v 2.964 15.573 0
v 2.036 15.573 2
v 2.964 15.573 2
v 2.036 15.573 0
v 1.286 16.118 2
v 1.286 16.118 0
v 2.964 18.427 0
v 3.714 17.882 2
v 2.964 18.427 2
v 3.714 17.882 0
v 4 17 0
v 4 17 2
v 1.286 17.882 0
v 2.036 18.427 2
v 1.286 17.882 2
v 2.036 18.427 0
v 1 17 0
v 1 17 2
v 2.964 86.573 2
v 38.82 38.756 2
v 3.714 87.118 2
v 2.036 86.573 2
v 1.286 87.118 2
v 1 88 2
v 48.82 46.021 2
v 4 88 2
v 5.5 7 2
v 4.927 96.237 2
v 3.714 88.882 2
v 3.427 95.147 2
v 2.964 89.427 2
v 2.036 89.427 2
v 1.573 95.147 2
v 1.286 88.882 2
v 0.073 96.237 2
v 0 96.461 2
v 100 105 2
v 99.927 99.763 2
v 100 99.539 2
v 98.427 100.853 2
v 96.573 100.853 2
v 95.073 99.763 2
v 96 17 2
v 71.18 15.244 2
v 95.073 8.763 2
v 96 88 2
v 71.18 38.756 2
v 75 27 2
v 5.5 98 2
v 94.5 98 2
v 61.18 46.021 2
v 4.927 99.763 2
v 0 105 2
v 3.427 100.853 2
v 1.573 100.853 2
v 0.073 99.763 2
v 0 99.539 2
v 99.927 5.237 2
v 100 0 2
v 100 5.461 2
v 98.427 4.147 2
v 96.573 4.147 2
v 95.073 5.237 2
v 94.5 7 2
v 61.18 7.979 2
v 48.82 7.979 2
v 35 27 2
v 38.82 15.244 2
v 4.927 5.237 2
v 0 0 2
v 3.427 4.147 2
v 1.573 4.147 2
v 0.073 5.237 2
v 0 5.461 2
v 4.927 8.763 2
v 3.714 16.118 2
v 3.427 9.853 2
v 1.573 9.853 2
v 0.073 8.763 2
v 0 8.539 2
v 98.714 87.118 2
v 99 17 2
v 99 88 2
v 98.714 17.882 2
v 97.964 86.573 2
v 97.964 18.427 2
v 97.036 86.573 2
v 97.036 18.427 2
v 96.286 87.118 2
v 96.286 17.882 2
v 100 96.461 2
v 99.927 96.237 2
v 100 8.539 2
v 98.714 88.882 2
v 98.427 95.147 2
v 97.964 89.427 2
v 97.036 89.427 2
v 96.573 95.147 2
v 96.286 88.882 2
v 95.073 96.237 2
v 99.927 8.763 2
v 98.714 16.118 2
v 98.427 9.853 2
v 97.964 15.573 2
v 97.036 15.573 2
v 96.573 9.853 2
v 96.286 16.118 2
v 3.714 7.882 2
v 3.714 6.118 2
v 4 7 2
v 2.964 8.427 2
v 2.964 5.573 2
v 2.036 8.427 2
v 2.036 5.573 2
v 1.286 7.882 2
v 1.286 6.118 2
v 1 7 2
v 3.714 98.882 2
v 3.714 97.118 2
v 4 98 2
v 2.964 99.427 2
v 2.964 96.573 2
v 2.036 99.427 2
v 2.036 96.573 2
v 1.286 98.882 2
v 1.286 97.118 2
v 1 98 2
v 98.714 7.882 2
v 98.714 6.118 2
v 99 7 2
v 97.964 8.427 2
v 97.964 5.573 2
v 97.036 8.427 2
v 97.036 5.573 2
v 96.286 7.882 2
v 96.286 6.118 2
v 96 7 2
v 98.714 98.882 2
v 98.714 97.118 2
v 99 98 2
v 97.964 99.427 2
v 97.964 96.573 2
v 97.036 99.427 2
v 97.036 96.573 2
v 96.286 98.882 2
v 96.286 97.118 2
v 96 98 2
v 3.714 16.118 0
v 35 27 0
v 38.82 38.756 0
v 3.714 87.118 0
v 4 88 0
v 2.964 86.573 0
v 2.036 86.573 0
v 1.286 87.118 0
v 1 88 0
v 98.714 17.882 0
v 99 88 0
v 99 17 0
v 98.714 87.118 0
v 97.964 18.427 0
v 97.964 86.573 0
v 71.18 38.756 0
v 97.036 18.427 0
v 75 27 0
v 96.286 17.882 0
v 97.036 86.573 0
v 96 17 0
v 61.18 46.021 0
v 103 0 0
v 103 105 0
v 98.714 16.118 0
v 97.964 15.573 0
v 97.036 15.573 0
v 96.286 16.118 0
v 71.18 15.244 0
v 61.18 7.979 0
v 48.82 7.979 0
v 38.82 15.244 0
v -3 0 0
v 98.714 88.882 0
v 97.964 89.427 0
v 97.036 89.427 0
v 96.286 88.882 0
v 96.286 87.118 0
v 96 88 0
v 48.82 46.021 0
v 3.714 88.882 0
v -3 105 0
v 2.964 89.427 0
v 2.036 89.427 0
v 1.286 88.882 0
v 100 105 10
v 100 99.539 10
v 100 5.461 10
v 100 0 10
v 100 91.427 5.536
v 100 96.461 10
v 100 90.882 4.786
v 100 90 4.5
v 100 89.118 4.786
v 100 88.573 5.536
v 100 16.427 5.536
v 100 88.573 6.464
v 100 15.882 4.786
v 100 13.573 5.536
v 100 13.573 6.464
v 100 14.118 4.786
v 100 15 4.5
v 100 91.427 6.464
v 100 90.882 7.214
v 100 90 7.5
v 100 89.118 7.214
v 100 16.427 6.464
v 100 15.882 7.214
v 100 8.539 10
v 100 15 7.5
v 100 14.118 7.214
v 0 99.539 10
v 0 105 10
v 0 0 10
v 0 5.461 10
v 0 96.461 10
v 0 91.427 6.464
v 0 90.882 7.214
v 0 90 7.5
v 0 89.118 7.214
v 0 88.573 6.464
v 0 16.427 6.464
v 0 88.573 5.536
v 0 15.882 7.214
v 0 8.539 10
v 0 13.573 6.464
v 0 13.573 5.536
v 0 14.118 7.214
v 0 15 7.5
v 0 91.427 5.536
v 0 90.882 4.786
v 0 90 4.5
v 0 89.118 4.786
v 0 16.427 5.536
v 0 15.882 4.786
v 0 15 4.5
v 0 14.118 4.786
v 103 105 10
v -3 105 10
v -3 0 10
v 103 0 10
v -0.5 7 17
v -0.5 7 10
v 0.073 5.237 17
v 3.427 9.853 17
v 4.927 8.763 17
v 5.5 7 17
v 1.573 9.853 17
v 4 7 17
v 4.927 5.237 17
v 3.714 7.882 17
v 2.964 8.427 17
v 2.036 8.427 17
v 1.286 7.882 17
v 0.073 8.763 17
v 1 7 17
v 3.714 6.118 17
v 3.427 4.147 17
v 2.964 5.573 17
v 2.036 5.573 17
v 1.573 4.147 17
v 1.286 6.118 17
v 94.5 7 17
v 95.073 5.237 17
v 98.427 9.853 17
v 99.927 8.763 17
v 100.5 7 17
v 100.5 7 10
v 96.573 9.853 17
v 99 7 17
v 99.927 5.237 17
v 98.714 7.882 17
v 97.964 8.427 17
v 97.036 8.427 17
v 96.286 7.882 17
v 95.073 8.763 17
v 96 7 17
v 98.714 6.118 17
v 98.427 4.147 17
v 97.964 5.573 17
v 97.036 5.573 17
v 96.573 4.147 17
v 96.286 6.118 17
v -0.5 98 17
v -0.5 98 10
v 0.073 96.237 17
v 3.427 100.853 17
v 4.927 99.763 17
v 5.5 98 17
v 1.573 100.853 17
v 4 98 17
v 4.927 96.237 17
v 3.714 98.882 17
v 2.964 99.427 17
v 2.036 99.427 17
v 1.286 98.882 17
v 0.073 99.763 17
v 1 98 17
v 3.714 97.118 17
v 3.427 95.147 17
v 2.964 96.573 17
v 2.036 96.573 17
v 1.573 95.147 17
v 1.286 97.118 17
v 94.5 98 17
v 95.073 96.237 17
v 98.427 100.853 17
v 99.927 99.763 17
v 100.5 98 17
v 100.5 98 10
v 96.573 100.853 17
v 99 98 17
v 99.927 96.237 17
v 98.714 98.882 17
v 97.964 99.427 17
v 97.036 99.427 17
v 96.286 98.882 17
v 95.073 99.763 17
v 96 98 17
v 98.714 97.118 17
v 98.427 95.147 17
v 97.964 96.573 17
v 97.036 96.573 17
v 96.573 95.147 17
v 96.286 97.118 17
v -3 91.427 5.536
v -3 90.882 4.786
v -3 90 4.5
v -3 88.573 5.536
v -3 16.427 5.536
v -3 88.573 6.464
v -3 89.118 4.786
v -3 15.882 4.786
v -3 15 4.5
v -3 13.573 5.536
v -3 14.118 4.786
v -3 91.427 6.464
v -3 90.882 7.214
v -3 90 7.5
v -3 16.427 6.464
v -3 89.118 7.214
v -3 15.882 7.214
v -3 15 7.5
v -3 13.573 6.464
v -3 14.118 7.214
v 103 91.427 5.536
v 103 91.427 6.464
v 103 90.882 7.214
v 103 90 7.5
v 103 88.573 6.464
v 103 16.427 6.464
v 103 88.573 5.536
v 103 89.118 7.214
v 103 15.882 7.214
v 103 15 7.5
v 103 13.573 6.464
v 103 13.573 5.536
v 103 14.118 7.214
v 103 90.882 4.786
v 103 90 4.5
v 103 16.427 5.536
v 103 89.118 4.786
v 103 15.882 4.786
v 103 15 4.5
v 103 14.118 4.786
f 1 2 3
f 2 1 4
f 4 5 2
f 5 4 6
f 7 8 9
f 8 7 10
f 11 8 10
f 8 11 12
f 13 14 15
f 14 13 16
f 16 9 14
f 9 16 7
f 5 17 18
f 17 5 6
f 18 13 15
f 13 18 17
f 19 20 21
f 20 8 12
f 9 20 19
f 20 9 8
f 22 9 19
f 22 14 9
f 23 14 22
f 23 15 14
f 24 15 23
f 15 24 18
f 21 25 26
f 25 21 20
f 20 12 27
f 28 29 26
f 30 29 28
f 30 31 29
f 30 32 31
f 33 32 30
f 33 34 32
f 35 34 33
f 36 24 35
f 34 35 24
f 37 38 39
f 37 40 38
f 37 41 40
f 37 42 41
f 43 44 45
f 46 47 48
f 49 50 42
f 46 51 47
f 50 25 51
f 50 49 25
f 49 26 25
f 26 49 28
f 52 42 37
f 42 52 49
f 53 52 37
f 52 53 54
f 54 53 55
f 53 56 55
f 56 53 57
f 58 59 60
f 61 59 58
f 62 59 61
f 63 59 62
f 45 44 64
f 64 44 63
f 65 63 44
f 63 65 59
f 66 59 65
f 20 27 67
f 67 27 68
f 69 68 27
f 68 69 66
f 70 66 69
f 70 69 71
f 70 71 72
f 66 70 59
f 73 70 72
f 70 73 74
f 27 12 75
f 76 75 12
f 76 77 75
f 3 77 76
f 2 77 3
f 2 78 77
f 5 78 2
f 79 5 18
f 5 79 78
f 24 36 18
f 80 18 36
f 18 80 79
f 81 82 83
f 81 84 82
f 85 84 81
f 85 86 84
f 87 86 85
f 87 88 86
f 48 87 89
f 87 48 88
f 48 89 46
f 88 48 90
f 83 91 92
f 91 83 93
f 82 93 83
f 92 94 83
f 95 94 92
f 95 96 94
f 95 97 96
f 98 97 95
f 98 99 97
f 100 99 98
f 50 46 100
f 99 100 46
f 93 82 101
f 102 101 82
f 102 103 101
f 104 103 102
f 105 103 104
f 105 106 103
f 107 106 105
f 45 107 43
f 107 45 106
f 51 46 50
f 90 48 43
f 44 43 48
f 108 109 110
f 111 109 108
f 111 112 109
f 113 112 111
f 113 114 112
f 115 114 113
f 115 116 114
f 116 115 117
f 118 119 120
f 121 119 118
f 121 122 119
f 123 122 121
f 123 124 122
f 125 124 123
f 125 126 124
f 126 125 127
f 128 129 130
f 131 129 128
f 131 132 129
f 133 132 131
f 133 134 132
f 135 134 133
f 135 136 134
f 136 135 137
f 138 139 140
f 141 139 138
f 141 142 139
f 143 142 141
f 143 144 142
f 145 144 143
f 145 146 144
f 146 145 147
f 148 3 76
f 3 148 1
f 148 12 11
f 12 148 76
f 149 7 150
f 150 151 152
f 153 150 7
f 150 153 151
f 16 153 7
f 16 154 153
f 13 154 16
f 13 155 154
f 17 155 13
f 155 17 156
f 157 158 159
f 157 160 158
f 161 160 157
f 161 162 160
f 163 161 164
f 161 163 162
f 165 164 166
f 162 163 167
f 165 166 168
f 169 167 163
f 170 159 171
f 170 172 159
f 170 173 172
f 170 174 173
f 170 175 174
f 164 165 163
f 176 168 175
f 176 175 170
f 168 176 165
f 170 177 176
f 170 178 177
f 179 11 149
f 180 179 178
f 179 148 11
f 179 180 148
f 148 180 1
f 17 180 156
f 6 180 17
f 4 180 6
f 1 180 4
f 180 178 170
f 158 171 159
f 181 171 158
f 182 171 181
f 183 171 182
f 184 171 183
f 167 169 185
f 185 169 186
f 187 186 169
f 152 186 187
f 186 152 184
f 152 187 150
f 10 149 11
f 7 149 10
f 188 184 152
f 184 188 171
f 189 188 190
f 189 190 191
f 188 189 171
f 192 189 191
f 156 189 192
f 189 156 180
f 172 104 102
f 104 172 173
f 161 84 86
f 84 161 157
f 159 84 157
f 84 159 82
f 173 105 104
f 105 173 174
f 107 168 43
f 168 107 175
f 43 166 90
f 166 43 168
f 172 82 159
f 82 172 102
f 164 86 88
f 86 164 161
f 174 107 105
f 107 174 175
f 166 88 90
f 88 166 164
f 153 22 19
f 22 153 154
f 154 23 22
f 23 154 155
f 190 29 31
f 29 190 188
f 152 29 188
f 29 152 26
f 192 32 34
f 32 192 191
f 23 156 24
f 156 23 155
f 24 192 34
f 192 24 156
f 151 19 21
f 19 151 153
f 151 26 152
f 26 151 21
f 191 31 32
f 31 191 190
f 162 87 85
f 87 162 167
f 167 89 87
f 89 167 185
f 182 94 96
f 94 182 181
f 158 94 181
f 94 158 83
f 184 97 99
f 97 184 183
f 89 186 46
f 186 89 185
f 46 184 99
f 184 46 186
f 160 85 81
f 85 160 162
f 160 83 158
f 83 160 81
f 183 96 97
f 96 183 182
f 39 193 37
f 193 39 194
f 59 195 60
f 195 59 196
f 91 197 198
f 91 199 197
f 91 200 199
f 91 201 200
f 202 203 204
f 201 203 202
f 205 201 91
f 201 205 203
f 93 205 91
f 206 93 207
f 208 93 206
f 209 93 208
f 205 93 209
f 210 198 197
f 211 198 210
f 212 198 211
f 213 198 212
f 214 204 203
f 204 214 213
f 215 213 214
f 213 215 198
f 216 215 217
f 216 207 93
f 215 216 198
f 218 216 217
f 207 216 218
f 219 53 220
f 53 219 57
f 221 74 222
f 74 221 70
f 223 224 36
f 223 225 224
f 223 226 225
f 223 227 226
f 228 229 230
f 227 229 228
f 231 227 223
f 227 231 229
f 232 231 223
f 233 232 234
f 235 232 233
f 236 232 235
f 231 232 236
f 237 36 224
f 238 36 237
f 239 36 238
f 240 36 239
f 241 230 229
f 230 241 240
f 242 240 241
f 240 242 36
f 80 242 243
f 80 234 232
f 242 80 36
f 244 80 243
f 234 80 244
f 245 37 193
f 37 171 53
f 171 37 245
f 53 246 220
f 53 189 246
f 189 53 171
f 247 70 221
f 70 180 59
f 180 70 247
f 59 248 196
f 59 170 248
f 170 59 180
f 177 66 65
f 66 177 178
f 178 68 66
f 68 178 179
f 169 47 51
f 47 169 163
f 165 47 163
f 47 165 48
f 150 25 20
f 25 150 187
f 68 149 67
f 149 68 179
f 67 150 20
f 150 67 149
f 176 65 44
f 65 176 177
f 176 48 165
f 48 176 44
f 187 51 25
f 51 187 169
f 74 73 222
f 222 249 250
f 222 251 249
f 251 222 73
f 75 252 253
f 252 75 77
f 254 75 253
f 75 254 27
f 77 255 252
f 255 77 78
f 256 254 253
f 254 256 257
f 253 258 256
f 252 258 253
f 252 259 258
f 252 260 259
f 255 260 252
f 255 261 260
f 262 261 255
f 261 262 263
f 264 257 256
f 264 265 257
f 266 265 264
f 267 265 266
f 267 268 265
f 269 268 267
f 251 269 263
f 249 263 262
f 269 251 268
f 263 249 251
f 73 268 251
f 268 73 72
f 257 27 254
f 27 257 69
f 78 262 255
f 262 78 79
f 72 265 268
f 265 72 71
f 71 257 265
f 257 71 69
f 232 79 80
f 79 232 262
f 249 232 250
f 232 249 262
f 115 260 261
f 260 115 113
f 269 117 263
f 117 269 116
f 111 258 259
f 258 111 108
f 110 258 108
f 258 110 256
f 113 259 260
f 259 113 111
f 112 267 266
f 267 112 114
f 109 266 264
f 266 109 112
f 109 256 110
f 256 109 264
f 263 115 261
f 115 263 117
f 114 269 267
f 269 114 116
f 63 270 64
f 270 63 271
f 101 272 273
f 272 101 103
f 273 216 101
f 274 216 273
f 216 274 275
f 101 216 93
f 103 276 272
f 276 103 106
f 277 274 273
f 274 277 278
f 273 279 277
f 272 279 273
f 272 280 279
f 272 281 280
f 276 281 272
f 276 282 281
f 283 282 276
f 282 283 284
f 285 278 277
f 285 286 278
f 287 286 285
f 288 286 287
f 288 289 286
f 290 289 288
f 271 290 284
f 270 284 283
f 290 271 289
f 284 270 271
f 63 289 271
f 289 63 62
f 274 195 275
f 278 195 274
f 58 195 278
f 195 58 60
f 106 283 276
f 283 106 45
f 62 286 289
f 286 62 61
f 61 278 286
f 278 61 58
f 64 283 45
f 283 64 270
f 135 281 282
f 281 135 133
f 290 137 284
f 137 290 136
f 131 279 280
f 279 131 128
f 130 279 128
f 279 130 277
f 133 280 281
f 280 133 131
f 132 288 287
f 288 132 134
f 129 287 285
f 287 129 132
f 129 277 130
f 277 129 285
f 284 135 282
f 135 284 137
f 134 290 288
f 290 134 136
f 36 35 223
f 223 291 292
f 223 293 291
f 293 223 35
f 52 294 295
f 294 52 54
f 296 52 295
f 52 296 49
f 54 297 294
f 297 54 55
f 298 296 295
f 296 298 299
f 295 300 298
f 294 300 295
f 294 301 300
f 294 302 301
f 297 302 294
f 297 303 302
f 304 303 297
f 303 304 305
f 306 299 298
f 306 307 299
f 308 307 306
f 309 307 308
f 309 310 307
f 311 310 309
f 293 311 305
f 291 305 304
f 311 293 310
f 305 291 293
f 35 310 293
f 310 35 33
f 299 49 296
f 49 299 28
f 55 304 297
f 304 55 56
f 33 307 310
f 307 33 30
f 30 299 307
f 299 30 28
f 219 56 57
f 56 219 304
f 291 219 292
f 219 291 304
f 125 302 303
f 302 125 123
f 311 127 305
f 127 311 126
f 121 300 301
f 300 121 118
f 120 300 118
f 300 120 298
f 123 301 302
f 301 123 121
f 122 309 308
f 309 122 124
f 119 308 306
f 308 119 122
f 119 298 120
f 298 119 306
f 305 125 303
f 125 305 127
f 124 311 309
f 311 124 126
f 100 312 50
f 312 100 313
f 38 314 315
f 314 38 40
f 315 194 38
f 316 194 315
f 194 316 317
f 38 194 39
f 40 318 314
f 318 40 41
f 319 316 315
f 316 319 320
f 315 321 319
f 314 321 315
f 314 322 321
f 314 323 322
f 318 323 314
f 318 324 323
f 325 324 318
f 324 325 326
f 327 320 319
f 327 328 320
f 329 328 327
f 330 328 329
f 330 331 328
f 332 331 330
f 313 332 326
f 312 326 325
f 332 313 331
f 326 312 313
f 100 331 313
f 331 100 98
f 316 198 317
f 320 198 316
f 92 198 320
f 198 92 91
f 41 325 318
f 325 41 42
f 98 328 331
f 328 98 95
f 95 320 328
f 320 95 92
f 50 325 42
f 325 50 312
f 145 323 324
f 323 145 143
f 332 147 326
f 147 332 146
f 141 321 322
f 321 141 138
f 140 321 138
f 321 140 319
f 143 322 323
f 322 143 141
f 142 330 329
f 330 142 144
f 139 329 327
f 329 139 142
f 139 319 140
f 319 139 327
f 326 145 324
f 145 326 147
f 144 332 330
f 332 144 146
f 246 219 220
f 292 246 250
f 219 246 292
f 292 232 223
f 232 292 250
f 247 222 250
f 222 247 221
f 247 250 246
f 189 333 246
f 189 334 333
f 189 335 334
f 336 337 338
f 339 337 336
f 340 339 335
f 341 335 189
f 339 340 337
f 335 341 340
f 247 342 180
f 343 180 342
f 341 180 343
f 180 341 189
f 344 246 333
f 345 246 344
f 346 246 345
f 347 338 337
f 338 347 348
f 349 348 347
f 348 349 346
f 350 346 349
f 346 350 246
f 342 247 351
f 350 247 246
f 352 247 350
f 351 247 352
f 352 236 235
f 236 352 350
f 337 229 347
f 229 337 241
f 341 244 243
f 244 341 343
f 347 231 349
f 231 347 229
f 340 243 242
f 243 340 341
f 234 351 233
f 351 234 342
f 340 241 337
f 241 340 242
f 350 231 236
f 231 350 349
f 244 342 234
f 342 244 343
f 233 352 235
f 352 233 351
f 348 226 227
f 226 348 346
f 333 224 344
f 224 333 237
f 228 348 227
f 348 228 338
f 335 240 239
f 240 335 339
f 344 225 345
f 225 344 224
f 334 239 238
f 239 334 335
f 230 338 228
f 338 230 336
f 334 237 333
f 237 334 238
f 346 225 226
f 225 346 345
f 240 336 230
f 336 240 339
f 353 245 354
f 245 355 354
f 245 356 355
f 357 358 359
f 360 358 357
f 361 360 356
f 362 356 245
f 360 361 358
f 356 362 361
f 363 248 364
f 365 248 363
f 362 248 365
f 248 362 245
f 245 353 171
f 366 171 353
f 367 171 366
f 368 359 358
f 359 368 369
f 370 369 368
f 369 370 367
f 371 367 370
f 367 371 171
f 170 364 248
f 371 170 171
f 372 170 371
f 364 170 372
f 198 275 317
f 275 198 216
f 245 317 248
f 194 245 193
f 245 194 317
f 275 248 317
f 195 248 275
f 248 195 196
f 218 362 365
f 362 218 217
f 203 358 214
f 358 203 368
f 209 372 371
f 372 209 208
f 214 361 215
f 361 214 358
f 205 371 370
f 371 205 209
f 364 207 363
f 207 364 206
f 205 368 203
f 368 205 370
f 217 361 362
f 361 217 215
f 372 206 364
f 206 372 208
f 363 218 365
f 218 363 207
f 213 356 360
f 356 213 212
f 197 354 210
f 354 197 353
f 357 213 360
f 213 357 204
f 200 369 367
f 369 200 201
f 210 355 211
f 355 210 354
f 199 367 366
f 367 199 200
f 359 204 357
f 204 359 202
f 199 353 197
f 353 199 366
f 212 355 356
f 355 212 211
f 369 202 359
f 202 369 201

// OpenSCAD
base_x = 100;
base_y = 105;
base_z = 2;

hole_dia = 3;

hole_dist_x = 95;
hole_dist_y = 91;

stand_h = 15;
stand_dia = 6;

vent_dia = 40;
vent_x = 55;
vent_y = 27;

sidewall_x = 3;
sidewall_h = base_z+8;
sidewall_hole_h = base_z+0.5*(sidewall_h-base_z);
sidewall_hole_d = 15;

$fn=10;

module stand() {
  difference() {
    cylinder(d=stand_dia, h=stand_h);
    cylinder(d=hole_dia, h=stand_h);
  }
}

module stands() {
  //translate([0.5*stand_dia, 0.5*stand_dia, base_z]) {
  translate([0, 0, base_z]) {
    stand();
    translate([hole_dist_x,0, 0]) stand();
    translate([0, hole_dist_y, 0]) stand();
    translate([hole_dist_x, hole_dist_y, 0]) stand();
  }
}

module base_holes() {
  //translate([0.5*stand_dia, 0.5*stand_dia, base_z]) {
    translate([0, 10, 0]) cylinder(d=hole_dia, h=base_z);
    translate([hole_dist_x,10, 0]) cylinder(d=hole_dia, h=base_z);
    translate([0, hole_dist_y-10, 0]) cylinder(d=hole_dia, h=base_z);
    translate([hole_dist_x, hole_dist_y-10, 0]) cylinder(d=hole_dia, h=base_z);
}

module vent() {
  cylinder(d=vent_dia, h=base_z);
}

module sidewall() {
  difference() {
    cube([sidewall_x, base_y, sidewall_h]);
    translate([0, sidewall_hole_d, sidewall_hole_h])
    rotate([0, 90, 0]) cylinder(h=sidewall_x*10, d=hole_dia);
    translate([0,base_y-sidewall_hole_d, sidewall_hole_h])
    rotate([0, 90, 0]) cylinder(h=sidewall_x*10, d=hole_dia);
  }
}

difference() {
  cube([base_x, base_y, base_z]);
  translate([vent_x, vent_y, 0]) vent();
  translate([0.5*(base_x-hole_dist_x), 0.5*(base_y-hole_dist_y), 0]) base_holes();
}
translate([0.5*(base_x-hole_dist_x), 0.5*(base_y-hole_dist_y), 0]) {
   stands();
}

translate([-sidewall_x, 0, 0]) sidewall();
translate([base_x, 0, 0]) sidewall();
